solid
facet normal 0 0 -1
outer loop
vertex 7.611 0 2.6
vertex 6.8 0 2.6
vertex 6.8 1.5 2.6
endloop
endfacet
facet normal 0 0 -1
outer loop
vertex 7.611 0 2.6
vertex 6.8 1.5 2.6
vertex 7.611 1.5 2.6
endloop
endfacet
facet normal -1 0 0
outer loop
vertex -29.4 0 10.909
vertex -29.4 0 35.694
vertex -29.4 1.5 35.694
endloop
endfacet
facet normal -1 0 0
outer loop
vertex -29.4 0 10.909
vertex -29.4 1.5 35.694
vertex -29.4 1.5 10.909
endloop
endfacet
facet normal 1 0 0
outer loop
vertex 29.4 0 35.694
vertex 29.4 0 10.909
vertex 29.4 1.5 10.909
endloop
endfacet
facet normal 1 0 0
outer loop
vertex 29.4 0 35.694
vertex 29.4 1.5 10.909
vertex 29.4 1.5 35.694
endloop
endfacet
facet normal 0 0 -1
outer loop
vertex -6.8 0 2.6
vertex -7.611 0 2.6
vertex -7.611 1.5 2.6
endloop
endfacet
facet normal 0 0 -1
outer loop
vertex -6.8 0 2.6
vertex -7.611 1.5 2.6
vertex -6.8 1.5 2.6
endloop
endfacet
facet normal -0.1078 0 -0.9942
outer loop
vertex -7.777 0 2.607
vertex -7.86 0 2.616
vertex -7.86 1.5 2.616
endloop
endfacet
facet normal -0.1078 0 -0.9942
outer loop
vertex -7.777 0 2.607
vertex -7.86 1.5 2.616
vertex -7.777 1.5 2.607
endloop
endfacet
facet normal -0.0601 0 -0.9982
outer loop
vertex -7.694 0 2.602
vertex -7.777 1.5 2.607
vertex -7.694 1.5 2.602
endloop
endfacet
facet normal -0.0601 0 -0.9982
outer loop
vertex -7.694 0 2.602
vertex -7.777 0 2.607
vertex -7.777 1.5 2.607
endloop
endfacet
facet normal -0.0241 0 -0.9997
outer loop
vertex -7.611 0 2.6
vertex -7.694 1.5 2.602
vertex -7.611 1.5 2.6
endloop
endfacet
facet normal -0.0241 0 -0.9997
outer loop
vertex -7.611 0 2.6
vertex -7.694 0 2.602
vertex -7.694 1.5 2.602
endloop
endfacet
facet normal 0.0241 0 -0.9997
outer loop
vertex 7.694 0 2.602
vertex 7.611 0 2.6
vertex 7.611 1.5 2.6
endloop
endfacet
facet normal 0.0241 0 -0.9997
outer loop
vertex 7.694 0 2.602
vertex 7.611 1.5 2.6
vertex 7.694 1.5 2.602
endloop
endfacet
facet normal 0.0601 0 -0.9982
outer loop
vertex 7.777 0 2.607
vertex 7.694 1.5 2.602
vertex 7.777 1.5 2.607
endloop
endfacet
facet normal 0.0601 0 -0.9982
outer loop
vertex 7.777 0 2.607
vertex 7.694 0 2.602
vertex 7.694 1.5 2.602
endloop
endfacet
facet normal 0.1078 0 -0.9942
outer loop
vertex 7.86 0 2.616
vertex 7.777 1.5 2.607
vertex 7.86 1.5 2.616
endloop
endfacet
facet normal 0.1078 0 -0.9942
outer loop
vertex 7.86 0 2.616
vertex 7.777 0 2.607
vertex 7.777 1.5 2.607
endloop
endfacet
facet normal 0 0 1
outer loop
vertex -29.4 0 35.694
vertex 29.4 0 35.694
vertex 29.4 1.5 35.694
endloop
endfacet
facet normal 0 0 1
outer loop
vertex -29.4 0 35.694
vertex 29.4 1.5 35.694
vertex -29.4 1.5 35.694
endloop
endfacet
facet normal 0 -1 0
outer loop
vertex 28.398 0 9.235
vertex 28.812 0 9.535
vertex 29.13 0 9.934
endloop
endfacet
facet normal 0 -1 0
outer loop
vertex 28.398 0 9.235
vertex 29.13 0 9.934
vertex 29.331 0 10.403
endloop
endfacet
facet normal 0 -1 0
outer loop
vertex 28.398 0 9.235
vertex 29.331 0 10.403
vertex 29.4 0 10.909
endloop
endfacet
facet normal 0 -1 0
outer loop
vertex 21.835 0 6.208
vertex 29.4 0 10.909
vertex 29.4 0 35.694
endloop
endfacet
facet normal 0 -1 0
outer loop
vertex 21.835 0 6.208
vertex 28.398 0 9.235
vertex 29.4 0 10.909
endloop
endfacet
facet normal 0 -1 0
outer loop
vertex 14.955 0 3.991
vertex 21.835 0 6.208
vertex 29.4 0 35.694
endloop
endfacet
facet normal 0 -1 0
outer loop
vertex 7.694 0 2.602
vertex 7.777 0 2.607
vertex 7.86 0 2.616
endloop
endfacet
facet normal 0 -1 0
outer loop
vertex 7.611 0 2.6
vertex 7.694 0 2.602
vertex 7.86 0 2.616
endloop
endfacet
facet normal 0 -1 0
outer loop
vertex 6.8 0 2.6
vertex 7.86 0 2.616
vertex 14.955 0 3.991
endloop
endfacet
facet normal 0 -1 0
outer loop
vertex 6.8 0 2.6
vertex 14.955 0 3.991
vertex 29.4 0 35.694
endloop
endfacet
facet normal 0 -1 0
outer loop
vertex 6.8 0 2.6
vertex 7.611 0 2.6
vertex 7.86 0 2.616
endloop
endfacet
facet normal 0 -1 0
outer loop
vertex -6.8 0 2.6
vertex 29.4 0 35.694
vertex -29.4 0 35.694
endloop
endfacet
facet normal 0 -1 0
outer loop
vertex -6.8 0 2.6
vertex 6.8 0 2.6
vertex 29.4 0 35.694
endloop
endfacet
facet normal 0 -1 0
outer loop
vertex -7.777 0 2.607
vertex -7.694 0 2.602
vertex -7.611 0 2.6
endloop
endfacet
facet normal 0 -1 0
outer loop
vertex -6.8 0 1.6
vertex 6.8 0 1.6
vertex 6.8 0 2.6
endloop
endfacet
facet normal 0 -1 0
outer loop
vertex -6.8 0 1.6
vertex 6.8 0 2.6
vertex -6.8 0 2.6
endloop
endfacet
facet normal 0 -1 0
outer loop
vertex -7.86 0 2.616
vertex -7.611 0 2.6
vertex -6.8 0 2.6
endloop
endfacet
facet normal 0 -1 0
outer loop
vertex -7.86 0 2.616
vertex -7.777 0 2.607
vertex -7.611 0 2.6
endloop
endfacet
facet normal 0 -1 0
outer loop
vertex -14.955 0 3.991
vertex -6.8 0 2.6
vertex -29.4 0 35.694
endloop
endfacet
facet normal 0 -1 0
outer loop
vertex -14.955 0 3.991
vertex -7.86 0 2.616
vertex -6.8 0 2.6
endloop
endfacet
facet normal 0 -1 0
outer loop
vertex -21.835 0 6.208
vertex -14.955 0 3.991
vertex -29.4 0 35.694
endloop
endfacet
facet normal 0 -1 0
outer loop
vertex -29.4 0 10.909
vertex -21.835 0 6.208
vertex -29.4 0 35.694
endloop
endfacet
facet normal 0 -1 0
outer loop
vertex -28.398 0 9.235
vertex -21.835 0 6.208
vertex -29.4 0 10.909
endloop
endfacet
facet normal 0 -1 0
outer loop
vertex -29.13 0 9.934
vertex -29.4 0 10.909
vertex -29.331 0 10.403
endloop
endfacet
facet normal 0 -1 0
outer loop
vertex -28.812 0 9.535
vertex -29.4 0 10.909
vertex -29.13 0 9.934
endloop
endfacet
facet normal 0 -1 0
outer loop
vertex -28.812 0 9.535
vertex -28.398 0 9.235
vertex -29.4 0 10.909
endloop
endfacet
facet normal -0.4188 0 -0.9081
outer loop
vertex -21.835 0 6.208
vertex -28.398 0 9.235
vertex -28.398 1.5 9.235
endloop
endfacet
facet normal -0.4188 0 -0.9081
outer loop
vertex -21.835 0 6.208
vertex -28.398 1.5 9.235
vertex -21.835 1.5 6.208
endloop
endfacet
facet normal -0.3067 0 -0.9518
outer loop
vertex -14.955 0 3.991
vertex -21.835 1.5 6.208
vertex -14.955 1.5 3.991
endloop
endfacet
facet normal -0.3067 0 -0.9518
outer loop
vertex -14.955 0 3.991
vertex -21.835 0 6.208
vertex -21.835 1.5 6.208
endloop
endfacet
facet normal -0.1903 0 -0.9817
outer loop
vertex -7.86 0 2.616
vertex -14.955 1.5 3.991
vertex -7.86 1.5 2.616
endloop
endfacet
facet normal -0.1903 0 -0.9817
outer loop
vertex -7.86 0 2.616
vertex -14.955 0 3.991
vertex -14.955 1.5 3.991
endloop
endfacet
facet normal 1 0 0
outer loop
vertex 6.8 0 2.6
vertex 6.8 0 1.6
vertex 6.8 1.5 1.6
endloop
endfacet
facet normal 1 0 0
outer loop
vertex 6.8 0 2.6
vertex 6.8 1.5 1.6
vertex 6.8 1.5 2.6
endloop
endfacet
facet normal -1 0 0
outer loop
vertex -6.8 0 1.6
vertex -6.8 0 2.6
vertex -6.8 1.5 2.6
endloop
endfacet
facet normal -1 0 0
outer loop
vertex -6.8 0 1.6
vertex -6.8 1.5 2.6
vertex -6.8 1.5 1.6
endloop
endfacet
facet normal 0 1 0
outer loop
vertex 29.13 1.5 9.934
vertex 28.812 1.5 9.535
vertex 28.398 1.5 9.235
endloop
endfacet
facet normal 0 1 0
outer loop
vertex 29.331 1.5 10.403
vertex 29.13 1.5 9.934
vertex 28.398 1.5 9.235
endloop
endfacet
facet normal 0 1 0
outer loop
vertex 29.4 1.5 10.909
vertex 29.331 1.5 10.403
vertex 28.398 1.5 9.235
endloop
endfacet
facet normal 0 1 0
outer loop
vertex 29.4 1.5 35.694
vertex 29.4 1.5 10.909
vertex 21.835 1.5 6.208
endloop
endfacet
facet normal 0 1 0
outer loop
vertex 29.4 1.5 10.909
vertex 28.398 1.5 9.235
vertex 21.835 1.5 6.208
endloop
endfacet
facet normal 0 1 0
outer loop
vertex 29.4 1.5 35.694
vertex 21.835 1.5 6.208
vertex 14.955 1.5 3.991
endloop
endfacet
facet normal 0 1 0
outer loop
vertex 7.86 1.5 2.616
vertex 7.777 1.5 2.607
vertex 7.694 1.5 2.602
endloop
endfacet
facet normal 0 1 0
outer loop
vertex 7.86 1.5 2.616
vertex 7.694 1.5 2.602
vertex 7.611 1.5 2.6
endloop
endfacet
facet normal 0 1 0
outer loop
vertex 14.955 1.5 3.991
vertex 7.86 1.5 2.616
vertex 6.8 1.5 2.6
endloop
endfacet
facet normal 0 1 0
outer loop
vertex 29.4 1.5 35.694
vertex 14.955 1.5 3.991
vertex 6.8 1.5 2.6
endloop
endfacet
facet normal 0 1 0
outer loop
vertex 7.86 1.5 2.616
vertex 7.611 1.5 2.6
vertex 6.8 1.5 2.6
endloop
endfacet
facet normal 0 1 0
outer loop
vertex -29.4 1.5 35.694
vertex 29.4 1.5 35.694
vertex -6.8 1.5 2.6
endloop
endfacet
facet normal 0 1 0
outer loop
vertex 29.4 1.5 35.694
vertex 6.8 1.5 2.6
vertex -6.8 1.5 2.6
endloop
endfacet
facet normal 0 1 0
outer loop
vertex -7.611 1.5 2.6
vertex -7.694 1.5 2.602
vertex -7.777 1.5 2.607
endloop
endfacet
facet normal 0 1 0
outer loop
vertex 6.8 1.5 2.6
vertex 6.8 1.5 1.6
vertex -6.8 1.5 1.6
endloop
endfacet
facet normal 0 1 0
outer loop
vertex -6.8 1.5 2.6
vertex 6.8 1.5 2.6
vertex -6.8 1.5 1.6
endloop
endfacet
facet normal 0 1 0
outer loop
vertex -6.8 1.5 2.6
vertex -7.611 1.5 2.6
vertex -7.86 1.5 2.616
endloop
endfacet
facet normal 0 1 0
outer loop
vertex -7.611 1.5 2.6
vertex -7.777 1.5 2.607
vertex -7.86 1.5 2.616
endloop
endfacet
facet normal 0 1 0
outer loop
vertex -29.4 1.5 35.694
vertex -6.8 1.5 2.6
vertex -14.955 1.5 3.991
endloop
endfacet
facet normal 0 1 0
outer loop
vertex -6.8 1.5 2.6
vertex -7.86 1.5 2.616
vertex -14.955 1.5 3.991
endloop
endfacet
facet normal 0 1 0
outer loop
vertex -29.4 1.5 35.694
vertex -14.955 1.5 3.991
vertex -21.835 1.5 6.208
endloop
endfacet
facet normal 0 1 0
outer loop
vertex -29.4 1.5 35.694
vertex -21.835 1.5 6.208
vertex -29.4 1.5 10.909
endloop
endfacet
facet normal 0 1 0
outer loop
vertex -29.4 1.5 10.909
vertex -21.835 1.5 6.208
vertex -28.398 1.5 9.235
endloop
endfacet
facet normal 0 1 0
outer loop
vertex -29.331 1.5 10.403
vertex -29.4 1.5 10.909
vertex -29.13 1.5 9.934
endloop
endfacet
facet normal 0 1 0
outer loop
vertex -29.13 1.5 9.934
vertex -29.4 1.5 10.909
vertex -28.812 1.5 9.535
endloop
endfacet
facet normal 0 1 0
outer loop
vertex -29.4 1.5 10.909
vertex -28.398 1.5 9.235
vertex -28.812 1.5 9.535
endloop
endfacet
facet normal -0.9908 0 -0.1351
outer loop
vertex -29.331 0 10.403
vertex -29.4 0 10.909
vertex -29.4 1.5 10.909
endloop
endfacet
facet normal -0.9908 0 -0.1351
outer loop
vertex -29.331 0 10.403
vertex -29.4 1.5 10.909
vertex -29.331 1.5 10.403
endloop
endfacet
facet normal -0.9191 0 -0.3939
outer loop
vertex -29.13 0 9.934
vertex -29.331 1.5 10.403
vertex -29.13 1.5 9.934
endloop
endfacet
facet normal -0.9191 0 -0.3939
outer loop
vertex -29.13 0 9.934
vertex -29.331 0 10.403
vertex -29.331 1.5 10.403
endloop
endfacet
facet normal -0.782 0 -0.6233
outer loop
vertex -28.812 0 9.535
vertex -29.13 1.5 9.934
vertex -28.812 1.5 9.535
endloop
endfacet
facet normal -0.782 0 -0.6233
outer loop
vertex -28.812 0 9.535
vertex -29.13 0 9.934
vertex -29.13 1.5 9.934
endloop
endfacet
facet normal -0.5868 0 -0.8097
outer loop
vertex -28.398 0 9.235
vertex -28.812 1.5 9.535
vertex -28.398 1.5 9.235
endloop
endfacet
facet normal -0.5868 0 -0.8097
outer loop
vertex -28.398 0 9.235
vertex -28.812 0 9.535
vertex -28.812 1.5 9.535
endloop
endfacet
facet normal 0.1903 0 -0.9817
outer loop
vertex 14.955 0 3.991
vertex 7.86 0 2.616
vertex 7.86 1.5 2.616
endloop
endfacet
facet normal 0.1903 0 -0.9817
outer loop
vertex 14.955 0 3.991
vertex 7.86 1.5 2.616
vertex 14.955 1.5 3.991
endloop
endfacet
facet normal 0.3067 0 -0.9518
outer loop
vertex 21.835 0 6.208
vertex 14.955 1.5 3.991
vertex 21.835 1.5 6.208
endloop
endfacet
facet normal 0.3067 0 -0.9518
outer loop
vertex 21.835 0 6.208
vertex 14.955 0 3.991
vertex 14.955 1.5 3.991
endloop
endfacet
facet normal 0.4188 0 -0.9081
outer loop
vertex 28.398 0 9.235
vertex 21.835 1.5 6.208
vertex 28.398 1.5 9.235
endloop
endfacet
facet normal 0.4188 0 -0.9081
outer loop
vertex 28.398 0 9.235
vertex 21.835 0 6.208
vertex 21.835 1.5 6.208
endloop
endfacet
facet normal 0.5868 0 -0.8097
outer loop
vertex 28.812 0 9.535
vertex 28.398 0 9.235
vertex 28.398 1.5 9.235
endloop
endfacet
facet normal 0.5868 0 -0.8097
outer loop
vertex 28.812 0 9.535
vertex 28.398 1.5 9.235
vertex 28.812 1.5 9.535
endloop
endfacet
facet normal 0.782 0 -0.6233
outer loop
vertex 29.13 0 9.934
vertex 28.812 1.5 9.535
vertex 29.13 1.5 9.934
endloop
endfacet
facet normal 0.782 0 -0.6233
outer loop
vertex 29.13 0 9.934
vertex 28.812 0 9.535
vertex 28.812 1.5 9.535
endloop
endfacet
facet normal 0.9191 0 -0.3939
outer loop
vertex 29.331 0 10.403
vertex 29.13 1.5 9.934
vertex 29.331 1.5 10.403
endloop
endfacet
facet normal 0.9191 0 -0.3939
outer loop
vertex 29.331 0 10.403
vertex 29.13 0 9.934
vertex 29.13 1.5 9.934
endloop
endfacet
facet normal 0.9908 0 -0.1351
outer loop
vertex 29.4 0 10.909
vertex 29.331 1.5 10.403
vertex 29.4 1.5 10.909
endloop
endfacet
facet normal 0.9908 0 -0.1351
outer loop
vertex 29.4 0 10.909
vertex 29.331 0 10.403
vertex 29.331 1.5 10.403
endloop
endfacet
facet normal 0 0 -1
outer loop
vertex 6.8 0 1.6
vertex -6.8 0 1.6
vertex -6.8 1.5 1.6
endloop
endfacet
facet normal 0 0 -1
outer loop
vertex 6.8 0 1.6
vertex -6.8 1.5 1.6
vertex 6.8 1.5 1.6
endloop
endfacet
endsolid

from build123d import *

# Parameters (mm, degrees)
BOSS_EXTRUDE1_DEPTH = 1.5


with BuildPart() as part:
    # Sketch1 → Boss-Extrude1 (new body)
    with BuildSketch(Plane(origin=(0, 0, 0), x_dir=(1, 0, 0), z_dir=(0, 1, 0))):
        with BuildLine():
            Line((29.399956383, -10.909440226), (29.399956383, -35.694042527))
            Line((29.399956383, -35.694042527), (-29.399956383, -35.694042527))
            Line((-29.399956383, -35.694042527), (-29.399956383, -10.909440226))
            ThreePointArc((-29.399956383, -10.909440226), (-29.130344067, -9.933819399), (-28.398023754, -9.235082141))
            ThreePointArc((-28.398023754, -9.235082141), (-18.42847588, -4.996086333), (-7.859761529, -2.616328524))
            ThreePointArc((-7.859761529, -2.616328524), (-7.735749713, -2.604086526), (-7.611202142, -2.6))
            Line((-7.611202142, -2.6), (-6.8, -2.6))
            Line((-6.8, -2.6), (-6.8, -1.6))
            Line((-6.8, -1.6), (6.8, -1.6))
            Line((6.8, -1.6), (6.8, -2.6))
            Line((6.8, -2.6), (7.611202142, -2.6))
            ThreePointArc((7.611202142, -2.6), (7.735749713, -2.604086526), (7.859761529, -2.616328524))
            ThreePointArc((7.859761529, -2.616328524), (18.42847588, -4.996086333), (28.398023754, -9.235082141))
            ThreePointArc((28.398023754, -9.235082141), (29.130344067, -9.933819399), (29.399956383, -10.909440226))
        make_face()
    extrude(amount=BOSS_EXTRUDE1_DEPTH)


solid = part.part
